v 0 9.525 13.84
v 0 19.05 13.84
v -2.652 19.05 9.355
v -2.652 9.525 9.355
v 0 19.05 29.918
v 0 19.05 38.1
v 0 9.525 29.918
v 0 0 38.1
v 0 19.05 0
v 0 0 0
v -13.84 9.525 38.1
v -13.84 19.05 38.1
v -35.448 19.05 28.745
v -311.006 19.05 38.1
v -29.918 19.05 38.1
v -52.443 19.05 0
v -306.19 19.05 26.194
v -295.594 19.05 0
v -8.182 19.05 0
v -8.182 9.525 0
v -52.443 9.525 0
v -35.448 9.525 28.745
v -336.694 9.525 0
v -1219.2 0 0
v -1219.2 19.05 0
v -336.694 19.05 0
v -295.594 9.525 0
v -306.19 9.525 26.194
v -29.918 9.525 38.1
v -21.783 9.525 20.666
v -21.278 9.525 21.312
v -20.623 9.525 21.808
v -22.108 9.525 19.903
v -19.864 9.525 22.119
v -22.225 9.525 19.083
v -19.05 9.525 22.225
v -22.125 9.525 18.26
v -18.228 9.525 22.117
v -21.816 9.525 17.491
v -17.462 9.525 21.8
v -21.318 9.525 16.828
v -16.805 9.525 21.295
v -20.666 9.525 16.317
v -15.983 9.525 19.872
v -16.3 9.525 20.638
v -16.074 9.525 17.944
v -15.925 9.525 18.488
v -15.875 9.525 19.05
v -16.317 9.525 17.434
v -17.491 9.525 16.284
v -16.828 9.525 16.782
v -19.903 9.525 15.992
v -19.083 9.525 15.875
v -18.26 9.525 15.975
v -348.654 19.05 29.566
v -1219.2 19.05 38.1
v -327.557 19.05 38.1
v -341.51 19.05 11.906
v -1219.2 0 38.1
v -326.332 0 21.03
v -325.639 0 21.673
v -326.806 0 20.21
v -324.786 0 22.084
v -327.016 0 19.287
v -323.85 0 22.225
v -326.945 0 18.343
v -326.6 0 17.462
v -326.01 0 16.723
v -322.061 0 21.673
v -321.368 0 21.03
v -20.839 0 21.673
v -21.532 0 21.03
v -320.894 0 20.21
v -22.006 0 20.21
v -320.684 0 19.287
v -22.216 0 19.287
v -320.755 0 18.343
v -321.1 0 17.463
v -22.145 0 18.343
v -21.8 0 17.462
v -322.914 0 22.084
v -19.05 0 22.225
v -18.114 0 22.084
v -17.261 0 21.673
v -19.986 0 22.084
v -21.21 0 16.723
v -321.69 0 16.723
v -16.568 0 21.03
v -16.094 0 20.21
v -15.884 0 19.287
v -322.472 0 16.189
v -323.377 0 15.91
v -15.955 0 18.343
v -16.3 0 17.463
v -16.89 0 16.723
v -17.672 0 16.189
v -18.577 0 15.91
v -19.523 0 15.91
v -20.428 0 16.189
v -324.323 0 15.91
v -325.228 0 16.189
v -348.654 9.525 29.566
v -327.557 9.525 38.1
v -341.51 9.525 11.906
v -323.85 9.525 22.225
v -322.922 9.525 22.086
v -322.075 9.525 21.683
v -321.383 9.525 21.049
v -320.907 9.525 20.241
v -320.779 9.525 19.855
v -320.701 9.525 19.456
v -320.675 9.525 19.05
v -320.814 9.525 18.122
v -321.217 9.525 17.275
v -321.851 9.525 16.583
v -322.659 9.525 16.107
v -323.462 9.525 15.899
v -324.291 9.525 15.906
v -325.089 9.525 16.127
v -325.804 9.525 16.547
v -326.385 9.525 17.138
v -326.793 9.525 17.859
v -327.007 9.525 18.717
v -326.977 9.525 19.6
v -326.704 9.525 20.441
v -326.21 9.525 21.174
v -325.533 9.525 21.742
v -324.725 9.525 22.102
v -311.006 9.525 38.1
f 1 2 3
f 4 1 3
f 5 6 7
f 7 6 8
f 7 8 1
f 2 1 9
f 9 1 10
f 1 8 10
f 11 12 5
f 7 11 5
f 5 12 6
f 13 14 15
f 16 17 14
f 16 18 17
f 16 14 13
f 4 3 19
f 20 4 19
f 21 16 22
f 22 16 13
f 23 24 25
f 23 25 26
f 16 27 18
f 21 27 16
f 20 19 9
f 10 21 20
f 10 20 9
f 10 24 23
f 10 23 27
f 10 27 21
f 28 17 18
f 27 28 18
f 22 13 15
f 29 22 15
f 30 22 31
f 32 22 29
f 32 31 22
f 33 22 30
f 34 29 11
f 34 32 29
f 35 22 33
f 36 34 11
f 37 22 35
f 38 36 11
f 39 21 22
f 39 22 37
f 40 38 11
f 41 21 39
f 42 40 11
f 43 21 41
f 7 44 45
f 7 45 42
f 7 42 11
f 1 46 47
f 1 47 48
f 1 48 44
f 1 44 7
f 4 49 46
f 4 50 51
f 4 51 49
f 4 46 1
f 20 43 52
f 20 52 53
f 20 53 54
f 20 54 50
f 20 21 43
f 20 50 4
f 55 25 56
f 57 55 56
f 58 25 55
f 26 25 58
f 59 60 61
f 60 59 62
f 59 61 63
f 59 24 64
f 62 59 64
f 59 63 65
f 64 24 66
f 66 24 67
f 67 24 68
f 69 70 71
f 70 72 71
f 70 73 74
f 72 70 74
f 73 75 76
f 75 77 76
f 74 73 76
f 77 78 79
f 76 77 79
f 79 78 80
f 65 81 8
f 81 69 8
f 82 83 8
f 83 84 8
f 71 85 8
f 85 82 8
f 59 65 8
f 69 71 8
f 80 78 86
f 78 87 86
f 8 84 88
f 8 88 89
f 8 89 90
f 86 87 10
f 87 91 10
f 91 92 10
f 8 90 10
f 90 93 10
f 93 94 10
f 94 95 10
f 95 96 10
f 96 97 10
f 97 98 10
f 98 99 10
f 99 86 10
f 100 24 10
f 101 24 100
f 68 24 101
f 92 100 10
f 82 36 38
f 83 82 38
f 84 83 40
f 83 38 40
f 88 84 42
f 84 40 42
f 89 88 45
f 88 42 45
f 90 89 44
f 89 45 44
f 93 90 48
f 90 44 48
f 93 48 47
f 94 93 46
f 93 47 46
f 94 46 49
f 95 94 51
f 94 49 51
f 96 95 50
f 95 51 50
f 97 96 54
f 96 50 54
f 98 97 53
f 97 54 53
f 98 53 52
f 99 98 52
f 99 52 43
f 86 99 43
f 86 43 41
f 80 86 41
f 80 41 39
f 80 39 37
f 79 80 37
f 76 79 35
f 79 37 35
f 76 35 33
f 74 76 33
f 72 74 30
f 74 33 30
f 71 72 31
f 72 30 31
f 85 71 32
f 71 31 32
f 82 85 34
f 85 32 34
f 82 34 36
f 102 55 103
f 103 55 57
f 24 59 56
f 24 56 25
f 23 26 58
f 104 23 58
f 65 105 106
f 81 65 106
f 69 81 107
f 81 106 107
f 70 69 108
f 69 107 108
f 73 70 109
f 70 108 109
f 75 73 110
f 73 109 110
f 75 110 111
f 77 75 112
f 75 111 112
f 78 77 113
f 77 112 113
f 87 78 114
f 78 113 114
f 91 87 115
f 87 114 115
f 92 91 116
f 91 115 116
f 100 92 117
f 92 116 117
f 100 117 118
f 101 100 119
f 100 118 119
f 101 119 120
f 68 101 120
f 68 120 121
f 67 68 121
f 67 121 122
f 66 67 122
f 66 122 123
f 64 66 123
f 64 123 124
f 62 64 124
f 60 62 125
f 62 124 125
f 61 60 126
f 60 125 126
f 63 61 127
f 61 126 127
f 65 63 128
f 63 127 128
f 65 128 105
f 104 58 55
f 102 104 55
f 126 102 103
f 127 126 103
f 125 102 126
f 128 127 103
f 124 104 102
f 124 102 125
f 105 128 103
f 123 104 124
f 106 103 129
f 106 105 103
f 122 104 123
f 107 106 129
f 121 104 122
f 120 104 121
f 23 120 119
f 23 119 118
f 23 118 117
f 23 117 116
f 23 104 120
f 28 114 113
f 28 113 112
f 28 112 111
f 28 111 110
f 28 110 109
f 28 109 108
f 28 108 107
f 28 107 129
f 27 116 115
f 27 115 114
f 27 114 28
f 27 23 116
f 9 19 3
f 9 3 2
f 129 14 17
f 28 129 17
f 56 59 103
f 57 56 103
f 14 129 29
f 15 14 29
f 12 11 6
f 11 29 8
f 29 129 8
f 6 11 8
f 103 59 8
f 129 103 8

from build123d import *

# Parameters (mm, degrees)
SKETCH2_W           = 1219.2
SKETCH2_H           = 38.1
BOSS_EXTRUDE2_DEPTH = 19.05
SKETCH3_R           = 3.175
CUT_EXTRUDE1_DEPTH  = 19.05
SKETCH4_R           = 3.175
CUT_EXTRUDE2_DEPTH  = 9.525


with BuildPart() as part:
    # Sketch2 → Boss-Extrude2 (new body)
    with BuildSketch(Plane(origin=(0, 0, 0), x_dir=(1, 0, 0), z_dir=(0, 1, 0))):
        with Locations((-609.6, -19.05)):
            Rectangle(SKETCH2_W, SKETCH2_H)
    extrude(amount=BOSS_EXTRUDE2_DEPTH)

    # Sketch3 → Cut-Extrude1 (cut)
    with BuildSketch(Plane(origin=(0, 19.05, 0), x_dir=(1, 0, 0), z_dir=(0, 1, 0))):
        with Locations((-19.05, -19.05)):
            Circle(SKETCH3_R)
        with Locations((-323.85, -19.05)):
            Circle(SKETCH3_R)
    extrude(amount=-CUT_EXTRUDE1_DEPTH, mode=Mode.SUBTRACT)

    # Sketch4 → Cut-Extrude2 (cut)
    # profile 1 of 2: a face of its own
    with BuildSketch(Plane(origin=(0, 19.05, 0), x_dir=(1, 0, 0), z_dir=(0, 1, 0))):
        Polygon((-336.69350738, 0), (-348.653572647, -29.566072647), (-327.557139607, -38.1), (-311.00649262, -38.1), (-295.594283764, 0), align=None)
        with Locations((-323.85, -19.05)):
            Circle(SKETCH4_R, mode=Mode.SUBTRACT)
    # profile 2 of 2: a face of its own
    with BuildSketch(Plane(origin=(0, 19.05, 0), x_dir=(1, 0, 0), z_dir=(0, 1, 0))):
        Polygon((-52.443119188, 0), (-29.917583168, -38.1), (-13.839851848, -38.1), (0, -29.917583168), (0, -13.839851848), (-8.182416832, 0), align=None)
        with Locations((-19.05, -19.05)):
            Circle(SKETCH4_R, mode=Mode.SUBTRACT)
    extrude(amount=-CUT_EXTRUDE2_DEPTH, mode=Mode.SUBTRACT)


solid = part.part
